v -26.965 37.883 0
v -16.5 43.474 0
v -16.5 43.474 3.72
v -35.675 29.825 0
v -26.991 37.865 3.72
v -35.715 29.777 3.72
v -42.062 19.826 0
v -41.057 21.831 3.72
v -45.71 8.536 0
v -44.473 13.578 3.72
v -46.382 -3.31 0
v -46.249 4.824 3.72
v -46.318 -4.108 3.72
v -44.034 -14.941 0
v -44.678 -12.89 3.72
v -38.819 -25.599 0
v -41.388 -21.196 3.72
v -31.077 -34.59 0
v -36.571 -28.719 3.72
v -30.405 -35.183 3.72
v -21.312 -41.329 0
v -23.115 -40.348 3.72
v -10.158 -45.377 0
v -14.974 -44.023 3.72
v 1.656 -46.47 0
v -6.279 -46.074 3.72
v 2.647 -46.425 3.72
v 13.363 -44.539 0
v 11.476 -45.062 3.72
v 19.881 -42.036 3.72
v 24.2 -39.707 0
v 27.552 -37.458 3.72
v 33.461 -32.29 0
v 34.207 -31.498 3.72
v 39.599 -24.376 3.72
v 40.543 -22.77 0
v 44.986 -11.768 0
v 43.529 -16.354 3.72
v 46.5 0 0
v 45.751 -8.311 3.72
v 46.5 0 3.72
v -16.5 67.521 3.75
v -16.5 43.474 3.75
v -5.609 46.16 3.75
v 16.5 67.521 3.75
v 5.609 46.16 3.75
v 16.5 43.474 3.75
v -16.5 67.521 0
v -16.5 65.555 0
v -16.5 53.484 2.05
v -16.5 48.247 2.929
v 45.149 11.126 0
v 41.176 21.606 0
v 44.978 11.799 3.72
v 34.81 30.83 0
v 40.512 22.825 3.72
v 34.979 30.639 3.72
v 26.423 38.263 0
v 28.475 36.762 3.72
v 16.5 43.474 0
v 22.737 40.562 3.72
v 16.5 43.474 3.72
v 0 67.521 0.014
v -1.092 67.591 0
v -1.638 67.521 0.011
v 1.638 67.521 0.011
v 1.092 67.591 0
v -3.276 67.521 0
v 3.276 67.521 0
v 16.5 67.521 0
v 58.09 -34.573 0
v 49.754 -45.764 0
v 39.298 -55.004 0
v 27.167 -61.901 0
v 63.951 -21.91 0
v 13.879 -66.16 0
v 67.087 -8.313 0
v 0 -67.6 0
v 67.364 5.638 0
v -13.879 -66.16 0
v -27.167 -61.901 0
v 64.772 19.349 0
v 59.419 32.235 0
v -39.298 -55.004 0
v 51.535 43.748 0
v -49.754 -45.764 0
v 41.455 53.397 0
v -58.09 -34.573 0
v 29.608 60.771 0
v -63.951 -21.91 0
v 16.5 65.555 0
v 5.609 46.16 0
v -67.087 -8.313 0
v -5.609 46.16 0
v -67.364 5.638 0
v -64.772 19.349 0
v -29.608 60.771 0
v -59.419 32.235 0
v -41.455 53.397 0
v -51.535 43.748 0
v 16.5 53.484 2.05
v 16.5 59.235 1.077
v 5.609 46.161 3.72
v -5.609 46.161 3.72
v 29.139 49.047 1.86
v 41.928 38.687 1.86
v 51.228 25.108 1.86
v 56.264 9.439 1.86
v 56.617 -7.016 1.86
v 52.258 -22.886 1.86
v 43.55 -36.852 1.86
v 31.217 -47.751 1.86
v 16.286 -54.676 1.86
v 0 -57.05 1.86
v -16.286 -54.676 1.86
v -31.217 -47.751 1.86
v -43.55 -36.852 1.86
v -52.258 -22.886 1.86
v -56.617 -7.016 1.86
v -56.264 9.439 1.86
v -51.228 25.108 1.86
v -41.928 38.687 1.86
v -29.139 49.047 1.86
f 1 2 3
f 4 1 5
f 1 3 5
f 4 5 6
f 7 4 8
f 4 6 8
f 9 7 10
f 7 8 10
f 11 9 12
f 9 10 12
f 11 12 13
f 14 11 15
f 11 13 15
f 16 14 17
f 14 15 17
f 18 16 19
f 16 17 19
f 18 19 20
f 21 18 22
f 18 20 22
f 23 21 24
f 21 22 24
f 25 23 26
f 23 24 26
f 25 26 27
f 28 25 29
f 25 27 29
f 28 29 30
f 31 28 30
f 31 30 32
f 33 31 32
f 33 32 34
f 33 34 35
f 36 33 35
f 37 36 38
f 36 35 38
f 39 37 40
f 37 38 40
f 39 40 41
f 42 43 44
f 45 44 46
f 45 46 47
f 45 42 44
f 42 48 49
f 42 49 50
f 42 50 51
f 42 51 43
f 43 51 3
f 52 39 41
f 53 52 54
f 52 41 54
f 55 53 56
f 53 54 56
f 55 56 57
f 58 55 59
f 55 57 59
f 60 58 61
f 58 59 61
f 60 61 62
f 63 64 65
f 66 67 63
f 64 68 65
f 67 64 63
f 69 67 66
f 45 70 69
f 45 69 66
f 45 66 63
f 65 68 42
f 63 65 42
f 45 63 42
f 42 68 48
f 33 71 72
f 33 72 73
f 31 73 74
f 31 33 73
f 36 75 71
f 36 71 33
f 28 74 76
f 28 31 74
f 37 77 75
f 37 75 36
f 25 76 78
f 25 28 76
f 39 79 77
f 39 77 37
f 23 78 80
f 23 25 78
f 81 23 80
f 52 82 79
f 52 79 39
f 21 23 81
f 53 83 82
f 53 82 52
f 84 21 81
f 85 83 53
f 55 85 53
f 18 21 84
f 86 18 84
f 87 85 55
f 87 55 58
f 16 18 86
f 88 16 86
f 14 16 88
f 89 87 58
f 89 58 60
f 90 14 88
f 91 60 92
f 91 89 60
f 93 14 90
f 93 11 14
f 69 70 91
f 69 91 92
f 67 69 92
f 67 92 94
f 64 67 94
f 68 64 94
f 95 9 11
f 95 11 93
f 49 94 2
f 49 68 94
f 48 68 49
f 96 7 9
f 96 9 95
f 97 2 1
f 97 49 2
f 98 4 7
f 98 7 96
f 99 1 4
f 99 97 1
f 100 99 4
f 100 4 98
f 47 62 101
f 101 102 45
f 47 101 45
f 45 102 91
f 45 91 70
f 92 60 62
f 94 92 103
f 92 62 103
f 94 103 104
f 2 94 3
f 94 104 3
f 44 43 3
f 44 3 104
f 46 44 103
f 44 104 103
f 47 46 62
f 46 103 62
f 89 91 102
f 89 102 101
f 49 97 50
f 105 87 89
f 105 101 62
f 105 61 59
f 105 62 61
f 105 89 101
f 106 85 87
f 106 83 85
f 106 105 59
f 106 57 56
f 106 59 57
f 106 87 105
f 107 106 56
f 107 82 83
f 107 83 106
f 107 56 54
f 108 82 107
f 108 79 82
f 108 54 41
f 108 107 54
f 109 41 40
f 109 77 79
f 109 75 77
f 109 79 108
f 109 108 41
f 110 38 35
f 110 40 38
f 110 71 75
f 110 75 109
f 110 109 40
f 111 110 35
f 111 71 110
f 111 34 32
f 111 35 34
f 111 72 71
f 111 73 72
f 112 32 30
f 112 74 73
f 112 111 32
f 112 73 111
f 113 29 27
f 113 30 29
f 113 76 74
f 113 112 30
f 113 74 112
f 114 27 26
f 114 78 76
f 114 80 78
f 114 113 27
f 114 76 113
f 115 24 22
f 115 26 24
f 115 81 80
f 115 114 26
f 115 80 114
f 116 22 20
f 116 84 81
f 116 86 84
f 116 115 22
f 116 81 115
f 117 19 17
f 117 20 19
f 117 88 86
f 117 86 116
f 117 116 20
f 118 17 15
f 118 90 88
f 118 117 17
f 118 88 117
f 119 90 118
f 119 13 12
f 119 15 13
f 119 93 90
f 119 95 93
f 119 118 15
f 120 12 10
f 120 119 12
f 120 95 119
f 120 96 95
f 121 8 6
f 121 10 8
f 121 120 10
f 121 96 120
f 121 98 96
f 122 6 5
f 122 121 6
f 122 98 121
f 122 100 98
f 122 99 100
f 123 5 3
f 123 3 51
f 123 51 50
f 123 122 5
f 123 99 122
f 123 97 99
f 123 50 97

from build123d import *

# Parameters (mm, degrees)
F3_DEPTH = 22.5
F4_DEPTH = 3.75


with BuildPart() as f1:
    # F0 (on Front) → F1 (revolve)
    with BuildSketch(Plane.XZ):
        Polygon((0, 0), (0, 11.919704), (-67.6, 0), align=None)
    revolve(axis=Axis((0, 0, 5.959852), (0, 0, -1)))

    # F2 (on Top) → F3 (cut, symmetric)
    with BuildSketch(Plane.XY):
        with BuildLine():
            ThreePointArc((-16.5, 43.47413), (-26.410225, -38.272052), (46.5, 0))
            ThreePointArc((46.5, 0), (38.272052, 26.410225), (16.5, 43.47413))
            ThreePointArc((16.5, 43.47413), (0, 46.5), (-16.5, 43.47413))
        make_face()
    extrude(amount=F3_DEPTH, both=True, mode=Mode.SUBTRACT)

    # F2 (on Top) → F4 (join)
    with BuildSketch(Plane.XY):
        with BuildLine():
            ThreePointArc((-16.5, 43.47413), (0, 46.5), (16.5, 43.47413))
            Line((16.5, 43.47413), (16.5, 67.52056))
            Line((16.5, 67.52056), (-16.5, 67.52056))
            Line((-16.5, 67.52056), (-16.5, 43.47413))
        make_face()
    extrude(amount=F4_DEPTH)


solid = f1.part
